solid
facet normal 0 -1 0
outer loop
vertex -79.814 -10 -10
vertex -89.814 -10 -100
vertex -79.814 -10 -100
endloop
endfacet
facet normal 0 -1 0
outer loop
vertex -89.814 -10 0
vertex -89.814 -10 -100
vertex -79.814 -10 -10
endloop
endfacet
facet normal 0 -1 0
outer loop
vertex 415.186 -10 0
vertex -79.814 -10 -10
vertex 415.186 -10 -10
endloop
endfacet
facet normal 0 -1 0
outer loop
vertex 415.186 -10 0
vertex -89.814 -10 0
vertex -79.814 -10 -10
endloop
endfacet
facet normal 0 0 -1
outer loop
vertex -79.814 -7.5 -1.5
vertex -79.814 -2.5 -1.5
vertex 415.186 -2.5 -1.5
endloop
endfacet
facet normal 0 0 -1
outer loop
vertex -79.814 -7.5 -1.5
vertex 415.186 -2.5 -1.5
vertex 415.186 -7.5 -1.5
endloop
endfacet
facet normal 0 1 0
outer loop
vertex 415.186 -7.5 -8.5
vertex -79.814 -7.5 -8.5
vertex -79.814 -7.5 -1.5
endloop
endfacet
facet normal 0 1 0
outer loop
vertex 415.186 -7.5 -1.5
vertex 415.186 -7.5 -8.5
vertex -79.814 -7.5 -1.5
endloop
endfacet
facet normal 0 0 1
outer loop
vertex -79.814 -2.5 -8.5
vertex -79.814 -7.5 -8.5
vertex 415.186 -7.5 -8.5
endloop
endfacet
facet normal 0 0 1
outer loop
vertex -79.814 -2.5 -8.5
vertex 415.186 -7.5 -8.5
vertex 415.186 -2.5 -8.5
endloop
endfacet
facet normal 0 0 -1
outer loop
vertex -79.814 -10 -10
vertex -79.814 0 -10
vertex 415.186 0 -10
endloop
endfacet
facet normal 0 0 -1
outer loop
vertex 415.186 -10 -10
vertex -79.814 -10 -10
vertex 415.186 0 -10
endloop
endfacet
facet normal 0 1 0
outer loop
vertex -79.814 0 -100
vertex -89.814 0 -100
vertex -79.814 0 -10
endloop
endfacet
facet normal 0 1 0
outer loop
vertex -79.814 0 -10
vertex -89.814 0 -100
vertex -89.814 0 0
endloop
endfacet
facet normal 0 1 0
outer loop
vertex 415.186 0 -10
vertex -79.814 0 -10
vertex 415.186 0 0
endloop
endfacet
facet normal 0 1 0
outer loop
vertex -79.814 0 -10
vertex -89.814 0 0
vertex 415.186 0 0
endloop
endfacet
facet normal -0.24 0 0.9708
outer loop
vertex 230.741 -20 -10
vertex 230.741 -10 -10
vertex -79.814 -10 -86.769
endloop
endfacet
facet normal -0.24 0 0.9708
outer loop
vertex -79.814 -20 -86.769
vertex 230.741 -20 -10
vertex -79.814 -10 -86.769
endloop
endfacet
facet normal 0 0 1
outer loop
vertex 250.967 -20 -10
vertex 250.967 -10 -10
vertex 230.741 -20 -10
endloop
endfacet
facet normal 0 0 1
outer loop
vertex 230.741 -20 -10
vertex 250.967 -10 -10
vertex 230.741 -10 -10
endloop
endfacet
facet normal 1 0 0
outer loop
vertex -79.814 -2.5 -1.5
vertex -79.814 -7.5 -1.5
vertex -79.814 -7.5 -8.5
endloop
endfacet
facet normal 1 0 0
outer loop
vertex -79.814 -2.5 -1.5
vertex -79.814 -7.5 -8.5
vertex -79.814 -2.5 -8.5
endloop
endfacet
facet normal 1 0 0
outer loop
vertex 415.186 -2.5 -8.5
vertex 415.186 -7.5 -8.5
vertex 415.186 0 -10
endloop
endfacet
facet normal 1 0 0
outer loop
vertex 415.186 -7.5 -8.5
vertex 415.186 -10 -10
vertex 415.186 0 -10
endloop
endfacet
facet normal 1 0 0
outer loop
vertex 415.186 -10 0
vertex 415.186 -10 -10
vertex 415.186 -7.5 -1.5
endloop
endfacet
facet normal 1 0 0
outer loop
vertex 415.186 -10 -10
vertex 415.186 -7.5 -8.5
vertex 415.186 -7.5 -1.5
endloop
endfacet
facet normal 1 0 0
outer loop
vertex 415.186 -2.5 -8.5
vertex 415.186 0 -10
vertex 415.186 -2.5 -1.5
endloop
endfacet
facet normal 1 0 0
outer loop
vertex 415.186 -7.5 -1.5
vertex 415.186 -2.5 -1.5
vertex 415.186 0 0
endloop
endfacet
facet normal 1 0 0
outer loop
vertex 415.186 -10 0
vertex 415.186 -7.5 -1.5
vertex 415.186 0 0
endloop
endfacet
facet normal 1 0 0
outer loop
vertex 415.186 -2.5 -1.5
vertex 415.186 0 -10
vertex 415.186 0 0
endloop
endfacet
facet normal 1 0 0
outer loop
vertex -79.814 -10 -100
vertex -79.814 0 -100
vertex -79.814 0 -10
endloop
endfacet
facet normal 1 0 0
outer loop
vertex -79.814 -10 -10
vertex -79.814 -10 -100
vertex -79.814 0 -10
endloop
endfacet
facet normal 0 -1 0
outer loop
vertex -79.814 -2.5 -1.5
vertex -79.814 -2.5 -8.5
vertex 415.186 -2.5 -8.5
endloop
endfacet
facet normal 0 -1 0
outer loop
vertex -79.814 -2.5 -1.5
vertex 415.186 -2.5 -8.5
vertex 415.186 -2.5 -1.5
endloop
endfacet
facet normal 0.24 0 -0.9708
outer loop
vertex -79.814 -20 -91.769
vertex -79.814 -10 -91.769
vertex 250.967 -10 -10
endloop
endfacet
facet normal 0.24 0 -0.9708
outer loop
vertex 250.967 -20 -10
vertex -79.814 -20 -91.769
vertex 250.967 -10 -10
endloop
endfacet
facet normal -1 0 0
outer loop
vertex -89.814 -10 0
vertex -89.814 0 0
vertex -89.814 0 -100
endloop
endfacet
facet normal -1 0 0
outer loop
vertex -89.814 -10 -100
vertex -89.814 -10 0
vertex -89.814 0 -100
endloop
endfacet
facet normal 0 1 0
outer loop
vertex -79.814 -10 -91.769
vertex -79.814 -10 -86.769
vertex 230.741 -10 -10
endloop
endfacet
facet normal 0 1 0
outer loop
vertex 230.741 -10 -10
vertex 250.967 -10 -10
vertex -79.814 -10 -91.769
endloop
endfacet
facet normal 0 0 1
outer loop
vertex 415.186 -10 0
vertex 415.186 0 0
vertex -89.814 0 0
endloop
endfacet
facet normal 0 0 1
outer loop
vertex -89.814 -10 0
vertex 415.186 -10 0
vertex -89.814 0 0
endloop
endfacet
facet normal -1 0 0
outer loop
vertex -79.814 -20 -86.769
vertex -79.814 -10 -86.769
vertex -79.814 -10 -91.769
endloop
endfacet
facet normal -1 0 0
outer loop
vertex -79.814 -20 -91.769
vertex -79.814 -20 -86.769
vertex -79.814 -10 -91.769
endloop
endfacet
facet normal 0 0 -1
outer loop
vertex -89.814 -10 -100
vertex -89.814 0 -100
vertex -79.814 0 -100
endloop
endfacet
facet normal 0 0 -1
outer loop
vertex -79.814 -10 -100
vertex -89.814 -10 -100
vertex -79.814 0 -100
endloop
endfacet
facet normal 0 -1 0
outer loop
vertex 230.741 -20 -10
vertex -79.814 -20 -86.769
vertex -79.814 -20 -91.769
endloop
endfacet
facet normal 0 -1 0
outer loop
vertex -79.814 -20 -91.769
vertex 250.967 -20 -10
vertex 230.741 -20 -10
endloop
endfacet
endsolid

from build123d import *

# Parameters (mm, degrees)
F0_W     = 495
F0_H     = 10
F1_DEPTH = 10
F2_W     = 2.5
F2_H     = 7
F3_DEPTH = 495
F5_DEPTH = 10


with BuildPart() as f1:
    # F0 (on Front) → F1 (new body)
    with BuildSketch(Plane.XZ):
        Polygon((-79.814313, -10), (-79.814313, 0), (-89.814313, 0), (-89.814313, -100), (-79.814313, -100), align=None)
        with Locations((167.685687, -5)):
            Rectangle(F0_W, F0_H)
    extrude(amount=F1_DEPTH)

    # F2 (on face) → F3 (cut)
    with BuildSketch(Plane.YZ.offset(415.185687)):
        with Locations((-6.25, -5)):
            Rectangle(F2_W, F2_H)
        with Locations((-3.75, -5)):
            Rectangle(F2_W, F2_H)
    extrude(amount=-F3_DEPTH, mode=Mode.SUBTRACT)


with BuildPart() as f5:
    # F4 (on face) → F5 (new body)
    with BuildSketch(Plane.XZ.offset(10)):
        Polygon((230.740586, -10), (-79.814313, -86.768635), (-79.814313, -91.768635), (250.967264, -10), align=None)
    extrude(amount=F5_DEPTH)


solid = Compound([f1.part, f5.part])
